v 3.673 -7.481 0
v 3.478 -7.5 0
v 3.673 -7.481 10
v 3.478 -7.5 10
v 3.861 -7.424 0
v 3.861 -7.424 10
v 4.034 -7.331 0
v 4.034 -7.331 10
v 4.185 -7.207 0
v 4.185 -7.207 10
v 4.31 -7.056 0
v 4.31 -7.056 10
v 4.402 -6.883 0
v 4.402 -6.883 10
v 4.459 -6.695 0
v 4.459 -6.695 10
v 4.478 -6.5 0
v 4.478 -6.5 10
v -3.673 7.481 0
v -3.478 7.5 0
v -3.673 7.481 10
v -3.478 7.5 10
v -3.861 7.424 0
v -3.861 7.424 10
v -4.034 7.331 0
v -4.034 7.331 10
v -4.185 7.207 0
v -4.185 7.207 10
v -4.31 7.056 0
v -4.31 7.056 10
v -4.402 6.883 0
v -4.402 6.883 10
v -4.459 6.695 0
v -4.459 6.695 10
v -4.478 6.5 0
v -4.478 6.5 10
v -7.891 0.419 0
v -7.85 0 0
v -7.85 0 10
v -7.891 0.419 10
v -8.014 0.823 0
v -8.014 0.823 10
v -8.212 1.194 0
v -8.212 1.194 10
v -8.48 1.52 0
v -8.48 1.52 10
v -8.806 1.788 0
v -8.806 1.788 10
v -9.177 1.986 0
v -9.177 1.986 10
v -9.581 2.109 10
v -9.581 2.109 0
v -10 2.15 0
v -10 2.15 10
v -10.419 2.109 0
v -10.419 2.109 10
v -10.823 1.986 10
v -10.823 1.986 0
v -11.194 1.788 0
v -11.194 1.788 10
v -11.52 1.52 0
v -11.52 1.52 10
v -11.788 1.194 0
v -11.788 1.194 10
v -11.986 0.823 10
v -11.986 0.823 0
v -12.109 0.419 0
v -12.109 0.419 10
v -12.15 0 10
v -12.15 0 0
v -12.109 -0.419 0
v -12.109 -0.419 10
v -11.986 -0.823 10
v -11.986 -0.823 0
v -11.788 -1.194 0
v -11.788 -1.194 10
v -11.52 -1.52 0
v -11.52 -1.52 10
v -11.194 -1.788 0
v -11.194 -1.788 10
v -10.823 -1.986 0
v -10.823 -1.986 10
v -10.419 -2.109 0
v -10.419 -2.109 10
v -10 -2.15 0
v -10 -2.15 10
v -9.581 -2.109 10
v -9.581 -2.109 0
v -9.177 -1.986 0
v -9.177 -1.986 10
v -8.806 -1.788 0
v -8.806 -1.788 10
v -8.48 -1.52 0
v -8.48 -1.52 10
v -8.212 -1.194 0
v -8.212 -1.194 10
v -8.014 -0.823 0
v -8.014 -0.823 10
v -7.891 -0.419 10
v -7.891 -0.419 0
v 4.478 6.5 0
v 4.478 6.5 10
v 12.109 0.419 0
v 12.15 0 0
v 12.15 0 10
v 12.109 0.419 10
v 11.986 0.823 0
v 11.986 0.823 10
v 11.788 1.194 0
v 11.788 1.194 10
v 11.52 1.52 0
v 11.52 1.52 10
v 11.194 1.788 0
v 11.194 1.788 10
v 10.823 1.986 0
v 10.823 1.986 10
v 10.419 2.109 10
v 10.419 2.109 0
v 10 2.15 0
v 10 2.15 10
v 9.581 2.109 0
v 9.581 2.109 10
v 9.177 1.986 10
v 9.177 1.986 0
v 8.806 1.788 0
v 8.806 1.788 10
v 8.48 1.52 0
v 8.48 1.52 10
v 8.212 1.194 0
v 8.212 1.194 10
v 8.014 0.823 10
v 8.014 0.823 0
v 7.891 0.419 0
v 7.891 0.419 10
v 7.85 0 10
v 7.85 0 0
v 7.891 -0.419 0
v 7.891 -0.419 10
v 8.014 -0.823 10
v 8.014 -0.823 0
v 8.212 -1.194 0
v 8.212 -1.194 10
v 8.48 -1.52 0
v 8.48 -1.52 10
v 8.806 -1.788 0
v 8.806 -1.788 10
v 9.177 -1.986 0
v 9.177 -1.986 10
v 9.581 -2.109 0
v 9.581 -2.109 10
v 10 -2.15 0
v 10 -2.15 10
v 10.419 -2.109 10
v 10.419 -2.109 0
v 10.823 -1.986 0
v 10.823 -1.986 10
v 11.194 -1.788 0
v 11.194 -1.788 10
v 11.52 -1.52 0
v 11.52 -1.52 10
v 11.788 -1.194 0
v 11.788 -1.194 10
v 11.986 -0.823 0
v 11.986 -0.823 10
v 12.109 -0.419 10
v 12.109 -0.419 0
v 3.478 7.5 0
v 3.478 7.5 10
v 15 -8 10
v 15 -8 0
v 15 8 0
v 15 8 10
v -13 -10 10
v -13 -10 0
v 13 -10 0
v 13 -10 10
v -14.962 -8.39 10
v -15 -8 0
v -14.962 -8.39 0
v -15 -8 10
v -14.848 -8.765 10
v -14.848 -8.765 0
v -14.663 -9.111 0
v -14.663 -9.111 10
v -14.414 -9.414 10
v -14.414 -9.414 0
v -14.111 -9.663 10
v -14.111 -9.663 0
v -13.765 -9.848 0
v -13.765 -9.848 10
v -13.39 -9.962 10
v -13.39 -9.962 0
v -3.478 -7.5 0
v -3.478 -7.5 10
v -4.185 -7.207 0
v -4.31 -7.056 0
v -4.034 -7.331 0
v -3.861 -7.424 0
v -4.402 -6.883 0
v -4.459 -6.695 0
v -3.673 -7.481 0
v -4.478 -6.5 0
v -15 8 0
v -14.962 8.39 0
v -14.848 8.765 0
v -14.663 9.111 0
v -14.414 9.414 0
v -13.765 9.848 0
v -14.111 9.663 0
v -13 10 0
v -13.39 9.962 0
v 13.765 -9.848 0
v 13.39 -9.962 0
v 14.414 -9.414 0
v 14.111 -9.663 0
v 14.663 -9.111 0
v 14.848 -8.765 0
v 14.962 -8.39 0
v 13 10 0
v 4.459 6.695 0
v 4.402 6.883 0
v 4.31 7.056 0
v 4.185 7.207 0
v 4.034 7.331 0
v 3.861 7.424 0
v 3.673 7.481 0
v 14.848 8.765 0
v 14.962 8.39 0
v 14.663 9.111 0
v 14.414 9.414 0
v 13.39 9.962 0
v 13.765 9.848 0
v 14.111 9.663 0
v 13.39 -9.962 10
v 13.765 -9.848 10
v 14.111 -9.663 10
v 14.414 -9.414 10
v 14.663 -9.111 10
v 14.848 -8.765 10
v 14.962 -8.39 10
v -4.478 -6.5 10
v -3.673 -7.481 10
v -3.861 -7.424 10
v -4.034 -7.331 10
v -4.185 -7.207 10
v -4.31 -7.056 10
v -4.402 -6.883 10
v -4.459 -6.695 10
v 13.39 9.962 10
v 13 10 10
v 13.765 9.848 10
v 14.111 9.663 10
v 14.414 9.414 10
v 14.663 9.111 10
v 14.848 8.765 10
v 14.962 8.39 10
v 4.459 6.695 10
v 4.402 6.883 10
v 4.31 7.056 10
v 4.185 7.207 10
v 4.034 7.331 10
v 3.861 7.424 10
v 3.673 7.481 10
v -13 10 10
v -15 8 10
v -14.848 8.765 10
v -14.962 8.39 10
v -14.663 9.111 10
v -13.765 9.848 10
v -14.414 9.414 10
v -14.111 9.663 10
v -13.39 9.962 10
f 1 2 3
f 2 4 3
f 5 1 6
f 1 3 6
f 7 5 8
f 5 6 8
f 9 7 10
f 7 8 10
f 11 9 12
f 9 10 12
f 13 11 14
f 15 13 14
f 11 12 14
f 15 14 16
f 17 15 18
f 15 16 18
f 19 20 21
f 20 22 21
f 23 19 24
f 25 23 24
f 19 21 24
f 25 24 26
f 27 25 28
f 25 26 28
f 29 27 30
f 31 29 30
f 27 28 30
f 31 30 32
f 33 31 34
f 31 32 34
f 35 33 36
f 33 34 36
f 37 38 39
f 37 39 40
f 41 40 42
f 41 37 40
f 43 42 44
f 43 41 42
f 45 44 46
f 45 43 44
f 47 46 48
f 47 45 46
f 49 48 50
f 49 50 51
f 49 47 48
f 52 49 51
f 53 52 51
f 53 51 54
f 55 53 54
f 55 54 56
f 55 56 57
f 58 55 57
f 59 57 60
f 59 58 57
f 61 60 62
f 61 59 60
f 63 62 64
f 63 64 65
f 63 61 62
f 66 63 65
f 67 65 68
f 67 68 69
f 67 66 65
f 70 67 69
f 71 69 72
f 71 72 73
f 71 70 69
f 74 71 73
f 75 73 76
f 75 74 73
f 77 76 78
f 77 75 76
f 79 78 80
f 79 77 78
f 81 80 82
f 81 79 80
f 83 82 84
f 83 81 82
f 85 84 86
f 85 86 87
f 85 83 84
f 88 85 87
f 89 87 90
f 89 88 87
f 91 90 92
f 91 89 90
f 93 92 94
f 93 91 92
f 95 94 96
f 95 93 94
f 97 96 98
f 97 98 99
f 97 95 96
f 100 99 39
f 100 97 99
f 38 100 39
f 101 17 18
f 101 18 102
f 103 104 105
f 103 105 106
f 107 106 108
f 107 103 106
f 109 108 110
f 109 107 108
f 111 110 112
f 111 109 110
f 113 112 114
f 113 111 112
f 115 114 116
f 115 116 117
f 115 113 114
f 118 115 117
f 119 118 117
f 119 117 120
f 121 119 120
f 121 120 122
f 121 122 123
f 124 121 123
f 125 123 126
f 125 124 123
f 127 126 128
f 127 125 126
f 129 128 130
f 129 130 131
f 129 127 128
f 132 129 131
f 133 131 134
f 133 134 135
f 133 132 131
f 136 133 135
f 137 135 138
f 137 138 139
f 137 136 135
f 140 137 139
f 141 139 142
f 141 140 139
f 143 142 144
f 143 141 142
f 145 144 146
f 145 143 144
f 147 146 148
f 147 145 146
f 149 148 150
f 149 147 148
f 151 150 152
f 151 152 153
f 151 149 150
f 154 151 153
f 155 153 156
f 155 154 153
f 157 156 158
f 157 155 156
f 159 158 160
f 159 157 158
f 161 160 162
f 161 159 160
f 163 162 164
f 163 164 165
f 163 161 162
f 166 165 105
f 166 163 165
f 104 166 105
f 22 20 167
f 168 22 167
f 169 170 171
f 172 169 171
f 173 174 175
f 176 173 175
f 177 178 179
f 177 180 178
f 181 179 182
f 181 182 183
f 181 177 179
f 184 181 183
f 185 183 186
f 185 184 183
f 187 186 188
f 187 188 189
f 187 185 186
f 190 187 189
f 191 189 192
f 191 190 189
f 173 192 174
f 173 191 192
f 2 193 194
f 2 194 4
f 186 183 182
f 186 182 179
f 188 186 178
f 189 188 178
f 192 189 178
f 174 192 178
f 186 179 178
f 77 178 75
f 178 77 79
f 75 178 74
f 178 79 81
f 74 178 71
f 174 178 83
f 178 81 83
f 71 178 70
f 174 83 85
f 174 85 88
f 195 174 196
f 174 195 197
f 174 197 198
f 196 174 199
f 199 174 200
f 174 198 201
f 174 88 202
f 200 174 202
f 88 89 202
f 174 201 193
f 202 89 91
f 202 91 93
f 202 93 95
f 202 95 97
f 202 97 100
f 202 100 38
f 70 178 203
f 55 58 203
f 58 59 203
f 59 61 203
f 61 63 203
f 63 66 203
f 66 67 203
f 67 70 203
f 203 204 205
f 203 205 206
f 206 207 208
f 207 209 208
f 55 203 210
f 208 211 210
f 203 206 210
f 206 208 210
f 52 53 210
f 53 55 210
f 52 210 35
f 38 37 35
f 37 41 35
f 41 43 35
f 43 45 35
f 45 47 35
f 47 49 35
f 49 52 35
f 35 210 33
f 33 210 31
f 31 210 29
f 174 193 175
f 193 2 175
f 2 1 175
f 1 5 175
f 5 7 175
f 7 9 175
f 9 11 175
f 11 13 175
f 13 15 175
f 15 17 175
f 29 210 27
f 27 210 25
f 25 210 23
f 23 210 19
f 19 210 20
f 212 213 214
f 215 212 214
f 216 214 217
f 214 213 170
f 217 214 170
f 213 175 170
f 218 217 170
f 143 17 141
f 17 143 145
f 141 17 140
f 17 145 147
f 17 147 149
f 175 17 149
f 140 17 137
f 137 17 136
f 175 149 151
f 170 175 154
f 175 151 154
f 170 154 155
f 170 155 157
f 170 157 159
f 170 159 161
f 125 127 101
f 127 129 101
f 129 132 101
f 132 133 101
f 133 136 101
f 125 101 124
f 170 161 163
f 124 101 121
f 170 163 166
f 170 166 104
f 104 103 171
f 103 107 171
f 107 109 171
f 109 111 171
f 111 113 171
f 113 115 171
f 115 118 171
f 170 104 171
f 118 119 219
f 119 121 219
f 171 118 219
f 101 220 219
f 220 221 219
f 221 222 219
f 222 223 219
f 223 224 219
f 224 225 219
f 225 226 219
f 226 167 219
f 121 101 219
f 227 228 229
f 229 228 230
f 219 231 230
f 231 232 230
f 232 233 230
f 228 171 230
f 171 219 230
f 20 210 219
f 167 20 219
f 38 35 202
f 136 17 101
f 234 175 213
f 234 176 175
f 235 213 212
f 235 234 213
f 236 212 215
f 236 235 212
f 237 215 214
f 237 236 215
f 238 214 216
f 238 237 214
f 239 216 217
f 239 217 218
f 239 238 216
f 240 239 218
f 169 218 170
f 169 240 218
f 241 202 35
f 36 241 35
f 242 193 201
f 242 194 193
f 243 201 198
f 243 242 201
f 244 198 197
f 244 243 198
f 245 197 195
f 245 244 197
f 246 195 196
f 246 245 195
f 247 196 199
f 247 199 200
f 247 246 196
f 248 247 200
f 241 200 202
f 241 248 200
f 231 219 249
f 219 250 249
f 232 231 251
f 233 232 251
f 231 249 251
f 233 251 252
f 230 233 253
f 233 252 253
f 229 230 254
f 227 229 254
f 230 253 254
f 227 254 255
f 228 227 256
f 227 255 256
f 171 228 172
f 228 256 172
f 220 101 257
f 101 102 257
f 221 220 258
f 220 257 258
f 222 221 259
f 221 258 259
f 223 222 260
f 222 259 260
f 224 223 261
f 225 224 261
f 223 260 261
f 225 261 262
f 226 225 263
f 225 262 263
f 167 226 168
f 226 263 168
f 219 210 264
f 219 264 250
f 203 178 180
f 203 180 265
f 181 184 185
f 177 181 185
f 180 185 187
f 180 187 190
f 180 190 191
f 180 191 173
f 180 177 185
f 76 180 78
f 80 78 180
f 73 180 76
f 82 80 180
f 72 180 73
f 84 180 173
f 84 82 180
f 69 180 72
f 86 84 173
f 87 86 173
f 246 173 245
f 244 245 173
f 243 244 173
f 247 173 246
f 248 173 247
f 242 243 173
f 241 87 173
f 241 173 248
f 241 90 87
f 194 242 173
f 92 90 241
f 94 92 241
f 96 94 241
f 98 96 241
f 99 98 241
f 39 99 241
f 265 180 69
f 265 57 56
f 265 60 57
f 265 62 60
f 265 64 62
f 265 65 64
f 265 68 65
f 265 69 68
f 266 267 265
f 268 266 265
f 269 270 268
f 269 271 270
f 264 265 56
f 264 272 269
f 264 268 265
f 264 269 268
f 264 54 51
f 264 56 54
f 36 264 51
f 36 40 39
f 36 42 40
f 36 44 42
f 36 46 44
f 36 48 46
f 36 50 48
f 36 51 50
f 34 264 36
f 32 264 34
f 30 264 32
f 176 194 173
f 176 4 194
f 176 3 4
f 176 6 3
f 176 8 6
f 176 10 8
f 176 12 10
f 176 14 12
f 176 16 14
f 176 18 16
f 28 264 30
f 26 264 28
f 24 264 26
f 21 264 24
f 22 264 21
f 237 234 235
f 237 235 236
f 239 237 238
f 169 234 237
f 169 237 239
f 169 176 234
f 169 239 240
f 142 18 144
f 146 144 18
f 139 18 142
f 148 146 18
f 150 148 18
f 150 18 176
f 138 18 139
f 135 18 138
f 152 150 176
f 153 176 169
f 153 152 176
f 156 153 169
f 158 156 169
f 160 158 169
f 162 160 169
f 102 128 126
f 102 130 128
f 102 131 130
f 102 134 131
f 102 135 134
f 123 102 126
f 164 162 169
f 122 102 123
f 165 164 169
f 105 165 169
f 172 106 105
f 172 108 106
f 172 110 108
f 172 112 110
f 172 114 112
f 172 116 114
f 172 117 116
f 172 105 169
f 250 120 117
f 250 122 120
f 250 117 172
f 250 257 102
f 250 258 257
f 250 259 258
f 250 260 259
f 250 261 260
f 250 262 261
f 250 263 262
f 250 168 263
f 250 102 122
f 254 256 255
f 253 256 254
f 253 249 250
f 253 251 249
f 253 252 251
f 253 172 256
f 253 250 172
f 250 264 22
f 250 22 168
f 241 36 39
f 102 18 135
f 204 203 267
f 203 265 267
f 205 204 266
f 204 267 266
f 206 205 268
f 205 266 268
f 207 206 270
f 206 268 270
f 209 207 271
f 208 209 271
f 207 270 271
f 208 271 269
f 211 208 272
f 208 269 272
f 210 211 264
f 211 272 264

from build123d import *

# Parameters (mm, degrees)
SKETCH_1_W      = 30
SKETCH_1_H      = 20
SKETCH_1_R      = 2.15
SKETCH_1_W_2    = 8.956326716
SKETCH_1_H_2    = 15
EXTRUDE_1_DEPTH = 10
FILLET_1_R      = 1
FILLET_2_R      = 2


with BuildPart() as part:
    # 草图1 → 凸台-拉伸1 (new body)
    with BuildSketch(Plane.XY):
        Rectangle(SKETCH_1_W, SKETCH_1_H)
        with Locations((-10, 0)):
            Circle(SKETCH_1_R, mode=Mode.SUBTRACT)
        with Locations((10, 0)):
            Circle(SKETCH_1_R, mode=Mode.SUBTRACT)
        Rectangle(SKETCH_1_W_2, SKETCH_1_H_2, mode=Mode.SUBTRACT)
    extrude(amount=EXTRUDE_1_DEPTH)

    # 圆角1
    fillet_1_edges = [part.edges().sort_by_distance(p)[0] for p in [
        (4.478163358, -7.5, 5),
        (4.478163358, 7.5, 5),
        (-4.478163358, 7.5, 5),
        (-4.478163358, -7.5, 5),
    ]]
    fillet(fillet_1_edges, radius=FILLET_1_R)

    # 圆角2
    fillet_2_edges = [part.edges().sort_by_distance(p)[0] for p in [
        (15, -10, 5),
        (-15, -10, 5),
        (-15, 10, 5),
        (15, 10, 5),
    ]]
    fillet(fillet_2_edges, radius=FILLET_2_R)


solid = part.part
